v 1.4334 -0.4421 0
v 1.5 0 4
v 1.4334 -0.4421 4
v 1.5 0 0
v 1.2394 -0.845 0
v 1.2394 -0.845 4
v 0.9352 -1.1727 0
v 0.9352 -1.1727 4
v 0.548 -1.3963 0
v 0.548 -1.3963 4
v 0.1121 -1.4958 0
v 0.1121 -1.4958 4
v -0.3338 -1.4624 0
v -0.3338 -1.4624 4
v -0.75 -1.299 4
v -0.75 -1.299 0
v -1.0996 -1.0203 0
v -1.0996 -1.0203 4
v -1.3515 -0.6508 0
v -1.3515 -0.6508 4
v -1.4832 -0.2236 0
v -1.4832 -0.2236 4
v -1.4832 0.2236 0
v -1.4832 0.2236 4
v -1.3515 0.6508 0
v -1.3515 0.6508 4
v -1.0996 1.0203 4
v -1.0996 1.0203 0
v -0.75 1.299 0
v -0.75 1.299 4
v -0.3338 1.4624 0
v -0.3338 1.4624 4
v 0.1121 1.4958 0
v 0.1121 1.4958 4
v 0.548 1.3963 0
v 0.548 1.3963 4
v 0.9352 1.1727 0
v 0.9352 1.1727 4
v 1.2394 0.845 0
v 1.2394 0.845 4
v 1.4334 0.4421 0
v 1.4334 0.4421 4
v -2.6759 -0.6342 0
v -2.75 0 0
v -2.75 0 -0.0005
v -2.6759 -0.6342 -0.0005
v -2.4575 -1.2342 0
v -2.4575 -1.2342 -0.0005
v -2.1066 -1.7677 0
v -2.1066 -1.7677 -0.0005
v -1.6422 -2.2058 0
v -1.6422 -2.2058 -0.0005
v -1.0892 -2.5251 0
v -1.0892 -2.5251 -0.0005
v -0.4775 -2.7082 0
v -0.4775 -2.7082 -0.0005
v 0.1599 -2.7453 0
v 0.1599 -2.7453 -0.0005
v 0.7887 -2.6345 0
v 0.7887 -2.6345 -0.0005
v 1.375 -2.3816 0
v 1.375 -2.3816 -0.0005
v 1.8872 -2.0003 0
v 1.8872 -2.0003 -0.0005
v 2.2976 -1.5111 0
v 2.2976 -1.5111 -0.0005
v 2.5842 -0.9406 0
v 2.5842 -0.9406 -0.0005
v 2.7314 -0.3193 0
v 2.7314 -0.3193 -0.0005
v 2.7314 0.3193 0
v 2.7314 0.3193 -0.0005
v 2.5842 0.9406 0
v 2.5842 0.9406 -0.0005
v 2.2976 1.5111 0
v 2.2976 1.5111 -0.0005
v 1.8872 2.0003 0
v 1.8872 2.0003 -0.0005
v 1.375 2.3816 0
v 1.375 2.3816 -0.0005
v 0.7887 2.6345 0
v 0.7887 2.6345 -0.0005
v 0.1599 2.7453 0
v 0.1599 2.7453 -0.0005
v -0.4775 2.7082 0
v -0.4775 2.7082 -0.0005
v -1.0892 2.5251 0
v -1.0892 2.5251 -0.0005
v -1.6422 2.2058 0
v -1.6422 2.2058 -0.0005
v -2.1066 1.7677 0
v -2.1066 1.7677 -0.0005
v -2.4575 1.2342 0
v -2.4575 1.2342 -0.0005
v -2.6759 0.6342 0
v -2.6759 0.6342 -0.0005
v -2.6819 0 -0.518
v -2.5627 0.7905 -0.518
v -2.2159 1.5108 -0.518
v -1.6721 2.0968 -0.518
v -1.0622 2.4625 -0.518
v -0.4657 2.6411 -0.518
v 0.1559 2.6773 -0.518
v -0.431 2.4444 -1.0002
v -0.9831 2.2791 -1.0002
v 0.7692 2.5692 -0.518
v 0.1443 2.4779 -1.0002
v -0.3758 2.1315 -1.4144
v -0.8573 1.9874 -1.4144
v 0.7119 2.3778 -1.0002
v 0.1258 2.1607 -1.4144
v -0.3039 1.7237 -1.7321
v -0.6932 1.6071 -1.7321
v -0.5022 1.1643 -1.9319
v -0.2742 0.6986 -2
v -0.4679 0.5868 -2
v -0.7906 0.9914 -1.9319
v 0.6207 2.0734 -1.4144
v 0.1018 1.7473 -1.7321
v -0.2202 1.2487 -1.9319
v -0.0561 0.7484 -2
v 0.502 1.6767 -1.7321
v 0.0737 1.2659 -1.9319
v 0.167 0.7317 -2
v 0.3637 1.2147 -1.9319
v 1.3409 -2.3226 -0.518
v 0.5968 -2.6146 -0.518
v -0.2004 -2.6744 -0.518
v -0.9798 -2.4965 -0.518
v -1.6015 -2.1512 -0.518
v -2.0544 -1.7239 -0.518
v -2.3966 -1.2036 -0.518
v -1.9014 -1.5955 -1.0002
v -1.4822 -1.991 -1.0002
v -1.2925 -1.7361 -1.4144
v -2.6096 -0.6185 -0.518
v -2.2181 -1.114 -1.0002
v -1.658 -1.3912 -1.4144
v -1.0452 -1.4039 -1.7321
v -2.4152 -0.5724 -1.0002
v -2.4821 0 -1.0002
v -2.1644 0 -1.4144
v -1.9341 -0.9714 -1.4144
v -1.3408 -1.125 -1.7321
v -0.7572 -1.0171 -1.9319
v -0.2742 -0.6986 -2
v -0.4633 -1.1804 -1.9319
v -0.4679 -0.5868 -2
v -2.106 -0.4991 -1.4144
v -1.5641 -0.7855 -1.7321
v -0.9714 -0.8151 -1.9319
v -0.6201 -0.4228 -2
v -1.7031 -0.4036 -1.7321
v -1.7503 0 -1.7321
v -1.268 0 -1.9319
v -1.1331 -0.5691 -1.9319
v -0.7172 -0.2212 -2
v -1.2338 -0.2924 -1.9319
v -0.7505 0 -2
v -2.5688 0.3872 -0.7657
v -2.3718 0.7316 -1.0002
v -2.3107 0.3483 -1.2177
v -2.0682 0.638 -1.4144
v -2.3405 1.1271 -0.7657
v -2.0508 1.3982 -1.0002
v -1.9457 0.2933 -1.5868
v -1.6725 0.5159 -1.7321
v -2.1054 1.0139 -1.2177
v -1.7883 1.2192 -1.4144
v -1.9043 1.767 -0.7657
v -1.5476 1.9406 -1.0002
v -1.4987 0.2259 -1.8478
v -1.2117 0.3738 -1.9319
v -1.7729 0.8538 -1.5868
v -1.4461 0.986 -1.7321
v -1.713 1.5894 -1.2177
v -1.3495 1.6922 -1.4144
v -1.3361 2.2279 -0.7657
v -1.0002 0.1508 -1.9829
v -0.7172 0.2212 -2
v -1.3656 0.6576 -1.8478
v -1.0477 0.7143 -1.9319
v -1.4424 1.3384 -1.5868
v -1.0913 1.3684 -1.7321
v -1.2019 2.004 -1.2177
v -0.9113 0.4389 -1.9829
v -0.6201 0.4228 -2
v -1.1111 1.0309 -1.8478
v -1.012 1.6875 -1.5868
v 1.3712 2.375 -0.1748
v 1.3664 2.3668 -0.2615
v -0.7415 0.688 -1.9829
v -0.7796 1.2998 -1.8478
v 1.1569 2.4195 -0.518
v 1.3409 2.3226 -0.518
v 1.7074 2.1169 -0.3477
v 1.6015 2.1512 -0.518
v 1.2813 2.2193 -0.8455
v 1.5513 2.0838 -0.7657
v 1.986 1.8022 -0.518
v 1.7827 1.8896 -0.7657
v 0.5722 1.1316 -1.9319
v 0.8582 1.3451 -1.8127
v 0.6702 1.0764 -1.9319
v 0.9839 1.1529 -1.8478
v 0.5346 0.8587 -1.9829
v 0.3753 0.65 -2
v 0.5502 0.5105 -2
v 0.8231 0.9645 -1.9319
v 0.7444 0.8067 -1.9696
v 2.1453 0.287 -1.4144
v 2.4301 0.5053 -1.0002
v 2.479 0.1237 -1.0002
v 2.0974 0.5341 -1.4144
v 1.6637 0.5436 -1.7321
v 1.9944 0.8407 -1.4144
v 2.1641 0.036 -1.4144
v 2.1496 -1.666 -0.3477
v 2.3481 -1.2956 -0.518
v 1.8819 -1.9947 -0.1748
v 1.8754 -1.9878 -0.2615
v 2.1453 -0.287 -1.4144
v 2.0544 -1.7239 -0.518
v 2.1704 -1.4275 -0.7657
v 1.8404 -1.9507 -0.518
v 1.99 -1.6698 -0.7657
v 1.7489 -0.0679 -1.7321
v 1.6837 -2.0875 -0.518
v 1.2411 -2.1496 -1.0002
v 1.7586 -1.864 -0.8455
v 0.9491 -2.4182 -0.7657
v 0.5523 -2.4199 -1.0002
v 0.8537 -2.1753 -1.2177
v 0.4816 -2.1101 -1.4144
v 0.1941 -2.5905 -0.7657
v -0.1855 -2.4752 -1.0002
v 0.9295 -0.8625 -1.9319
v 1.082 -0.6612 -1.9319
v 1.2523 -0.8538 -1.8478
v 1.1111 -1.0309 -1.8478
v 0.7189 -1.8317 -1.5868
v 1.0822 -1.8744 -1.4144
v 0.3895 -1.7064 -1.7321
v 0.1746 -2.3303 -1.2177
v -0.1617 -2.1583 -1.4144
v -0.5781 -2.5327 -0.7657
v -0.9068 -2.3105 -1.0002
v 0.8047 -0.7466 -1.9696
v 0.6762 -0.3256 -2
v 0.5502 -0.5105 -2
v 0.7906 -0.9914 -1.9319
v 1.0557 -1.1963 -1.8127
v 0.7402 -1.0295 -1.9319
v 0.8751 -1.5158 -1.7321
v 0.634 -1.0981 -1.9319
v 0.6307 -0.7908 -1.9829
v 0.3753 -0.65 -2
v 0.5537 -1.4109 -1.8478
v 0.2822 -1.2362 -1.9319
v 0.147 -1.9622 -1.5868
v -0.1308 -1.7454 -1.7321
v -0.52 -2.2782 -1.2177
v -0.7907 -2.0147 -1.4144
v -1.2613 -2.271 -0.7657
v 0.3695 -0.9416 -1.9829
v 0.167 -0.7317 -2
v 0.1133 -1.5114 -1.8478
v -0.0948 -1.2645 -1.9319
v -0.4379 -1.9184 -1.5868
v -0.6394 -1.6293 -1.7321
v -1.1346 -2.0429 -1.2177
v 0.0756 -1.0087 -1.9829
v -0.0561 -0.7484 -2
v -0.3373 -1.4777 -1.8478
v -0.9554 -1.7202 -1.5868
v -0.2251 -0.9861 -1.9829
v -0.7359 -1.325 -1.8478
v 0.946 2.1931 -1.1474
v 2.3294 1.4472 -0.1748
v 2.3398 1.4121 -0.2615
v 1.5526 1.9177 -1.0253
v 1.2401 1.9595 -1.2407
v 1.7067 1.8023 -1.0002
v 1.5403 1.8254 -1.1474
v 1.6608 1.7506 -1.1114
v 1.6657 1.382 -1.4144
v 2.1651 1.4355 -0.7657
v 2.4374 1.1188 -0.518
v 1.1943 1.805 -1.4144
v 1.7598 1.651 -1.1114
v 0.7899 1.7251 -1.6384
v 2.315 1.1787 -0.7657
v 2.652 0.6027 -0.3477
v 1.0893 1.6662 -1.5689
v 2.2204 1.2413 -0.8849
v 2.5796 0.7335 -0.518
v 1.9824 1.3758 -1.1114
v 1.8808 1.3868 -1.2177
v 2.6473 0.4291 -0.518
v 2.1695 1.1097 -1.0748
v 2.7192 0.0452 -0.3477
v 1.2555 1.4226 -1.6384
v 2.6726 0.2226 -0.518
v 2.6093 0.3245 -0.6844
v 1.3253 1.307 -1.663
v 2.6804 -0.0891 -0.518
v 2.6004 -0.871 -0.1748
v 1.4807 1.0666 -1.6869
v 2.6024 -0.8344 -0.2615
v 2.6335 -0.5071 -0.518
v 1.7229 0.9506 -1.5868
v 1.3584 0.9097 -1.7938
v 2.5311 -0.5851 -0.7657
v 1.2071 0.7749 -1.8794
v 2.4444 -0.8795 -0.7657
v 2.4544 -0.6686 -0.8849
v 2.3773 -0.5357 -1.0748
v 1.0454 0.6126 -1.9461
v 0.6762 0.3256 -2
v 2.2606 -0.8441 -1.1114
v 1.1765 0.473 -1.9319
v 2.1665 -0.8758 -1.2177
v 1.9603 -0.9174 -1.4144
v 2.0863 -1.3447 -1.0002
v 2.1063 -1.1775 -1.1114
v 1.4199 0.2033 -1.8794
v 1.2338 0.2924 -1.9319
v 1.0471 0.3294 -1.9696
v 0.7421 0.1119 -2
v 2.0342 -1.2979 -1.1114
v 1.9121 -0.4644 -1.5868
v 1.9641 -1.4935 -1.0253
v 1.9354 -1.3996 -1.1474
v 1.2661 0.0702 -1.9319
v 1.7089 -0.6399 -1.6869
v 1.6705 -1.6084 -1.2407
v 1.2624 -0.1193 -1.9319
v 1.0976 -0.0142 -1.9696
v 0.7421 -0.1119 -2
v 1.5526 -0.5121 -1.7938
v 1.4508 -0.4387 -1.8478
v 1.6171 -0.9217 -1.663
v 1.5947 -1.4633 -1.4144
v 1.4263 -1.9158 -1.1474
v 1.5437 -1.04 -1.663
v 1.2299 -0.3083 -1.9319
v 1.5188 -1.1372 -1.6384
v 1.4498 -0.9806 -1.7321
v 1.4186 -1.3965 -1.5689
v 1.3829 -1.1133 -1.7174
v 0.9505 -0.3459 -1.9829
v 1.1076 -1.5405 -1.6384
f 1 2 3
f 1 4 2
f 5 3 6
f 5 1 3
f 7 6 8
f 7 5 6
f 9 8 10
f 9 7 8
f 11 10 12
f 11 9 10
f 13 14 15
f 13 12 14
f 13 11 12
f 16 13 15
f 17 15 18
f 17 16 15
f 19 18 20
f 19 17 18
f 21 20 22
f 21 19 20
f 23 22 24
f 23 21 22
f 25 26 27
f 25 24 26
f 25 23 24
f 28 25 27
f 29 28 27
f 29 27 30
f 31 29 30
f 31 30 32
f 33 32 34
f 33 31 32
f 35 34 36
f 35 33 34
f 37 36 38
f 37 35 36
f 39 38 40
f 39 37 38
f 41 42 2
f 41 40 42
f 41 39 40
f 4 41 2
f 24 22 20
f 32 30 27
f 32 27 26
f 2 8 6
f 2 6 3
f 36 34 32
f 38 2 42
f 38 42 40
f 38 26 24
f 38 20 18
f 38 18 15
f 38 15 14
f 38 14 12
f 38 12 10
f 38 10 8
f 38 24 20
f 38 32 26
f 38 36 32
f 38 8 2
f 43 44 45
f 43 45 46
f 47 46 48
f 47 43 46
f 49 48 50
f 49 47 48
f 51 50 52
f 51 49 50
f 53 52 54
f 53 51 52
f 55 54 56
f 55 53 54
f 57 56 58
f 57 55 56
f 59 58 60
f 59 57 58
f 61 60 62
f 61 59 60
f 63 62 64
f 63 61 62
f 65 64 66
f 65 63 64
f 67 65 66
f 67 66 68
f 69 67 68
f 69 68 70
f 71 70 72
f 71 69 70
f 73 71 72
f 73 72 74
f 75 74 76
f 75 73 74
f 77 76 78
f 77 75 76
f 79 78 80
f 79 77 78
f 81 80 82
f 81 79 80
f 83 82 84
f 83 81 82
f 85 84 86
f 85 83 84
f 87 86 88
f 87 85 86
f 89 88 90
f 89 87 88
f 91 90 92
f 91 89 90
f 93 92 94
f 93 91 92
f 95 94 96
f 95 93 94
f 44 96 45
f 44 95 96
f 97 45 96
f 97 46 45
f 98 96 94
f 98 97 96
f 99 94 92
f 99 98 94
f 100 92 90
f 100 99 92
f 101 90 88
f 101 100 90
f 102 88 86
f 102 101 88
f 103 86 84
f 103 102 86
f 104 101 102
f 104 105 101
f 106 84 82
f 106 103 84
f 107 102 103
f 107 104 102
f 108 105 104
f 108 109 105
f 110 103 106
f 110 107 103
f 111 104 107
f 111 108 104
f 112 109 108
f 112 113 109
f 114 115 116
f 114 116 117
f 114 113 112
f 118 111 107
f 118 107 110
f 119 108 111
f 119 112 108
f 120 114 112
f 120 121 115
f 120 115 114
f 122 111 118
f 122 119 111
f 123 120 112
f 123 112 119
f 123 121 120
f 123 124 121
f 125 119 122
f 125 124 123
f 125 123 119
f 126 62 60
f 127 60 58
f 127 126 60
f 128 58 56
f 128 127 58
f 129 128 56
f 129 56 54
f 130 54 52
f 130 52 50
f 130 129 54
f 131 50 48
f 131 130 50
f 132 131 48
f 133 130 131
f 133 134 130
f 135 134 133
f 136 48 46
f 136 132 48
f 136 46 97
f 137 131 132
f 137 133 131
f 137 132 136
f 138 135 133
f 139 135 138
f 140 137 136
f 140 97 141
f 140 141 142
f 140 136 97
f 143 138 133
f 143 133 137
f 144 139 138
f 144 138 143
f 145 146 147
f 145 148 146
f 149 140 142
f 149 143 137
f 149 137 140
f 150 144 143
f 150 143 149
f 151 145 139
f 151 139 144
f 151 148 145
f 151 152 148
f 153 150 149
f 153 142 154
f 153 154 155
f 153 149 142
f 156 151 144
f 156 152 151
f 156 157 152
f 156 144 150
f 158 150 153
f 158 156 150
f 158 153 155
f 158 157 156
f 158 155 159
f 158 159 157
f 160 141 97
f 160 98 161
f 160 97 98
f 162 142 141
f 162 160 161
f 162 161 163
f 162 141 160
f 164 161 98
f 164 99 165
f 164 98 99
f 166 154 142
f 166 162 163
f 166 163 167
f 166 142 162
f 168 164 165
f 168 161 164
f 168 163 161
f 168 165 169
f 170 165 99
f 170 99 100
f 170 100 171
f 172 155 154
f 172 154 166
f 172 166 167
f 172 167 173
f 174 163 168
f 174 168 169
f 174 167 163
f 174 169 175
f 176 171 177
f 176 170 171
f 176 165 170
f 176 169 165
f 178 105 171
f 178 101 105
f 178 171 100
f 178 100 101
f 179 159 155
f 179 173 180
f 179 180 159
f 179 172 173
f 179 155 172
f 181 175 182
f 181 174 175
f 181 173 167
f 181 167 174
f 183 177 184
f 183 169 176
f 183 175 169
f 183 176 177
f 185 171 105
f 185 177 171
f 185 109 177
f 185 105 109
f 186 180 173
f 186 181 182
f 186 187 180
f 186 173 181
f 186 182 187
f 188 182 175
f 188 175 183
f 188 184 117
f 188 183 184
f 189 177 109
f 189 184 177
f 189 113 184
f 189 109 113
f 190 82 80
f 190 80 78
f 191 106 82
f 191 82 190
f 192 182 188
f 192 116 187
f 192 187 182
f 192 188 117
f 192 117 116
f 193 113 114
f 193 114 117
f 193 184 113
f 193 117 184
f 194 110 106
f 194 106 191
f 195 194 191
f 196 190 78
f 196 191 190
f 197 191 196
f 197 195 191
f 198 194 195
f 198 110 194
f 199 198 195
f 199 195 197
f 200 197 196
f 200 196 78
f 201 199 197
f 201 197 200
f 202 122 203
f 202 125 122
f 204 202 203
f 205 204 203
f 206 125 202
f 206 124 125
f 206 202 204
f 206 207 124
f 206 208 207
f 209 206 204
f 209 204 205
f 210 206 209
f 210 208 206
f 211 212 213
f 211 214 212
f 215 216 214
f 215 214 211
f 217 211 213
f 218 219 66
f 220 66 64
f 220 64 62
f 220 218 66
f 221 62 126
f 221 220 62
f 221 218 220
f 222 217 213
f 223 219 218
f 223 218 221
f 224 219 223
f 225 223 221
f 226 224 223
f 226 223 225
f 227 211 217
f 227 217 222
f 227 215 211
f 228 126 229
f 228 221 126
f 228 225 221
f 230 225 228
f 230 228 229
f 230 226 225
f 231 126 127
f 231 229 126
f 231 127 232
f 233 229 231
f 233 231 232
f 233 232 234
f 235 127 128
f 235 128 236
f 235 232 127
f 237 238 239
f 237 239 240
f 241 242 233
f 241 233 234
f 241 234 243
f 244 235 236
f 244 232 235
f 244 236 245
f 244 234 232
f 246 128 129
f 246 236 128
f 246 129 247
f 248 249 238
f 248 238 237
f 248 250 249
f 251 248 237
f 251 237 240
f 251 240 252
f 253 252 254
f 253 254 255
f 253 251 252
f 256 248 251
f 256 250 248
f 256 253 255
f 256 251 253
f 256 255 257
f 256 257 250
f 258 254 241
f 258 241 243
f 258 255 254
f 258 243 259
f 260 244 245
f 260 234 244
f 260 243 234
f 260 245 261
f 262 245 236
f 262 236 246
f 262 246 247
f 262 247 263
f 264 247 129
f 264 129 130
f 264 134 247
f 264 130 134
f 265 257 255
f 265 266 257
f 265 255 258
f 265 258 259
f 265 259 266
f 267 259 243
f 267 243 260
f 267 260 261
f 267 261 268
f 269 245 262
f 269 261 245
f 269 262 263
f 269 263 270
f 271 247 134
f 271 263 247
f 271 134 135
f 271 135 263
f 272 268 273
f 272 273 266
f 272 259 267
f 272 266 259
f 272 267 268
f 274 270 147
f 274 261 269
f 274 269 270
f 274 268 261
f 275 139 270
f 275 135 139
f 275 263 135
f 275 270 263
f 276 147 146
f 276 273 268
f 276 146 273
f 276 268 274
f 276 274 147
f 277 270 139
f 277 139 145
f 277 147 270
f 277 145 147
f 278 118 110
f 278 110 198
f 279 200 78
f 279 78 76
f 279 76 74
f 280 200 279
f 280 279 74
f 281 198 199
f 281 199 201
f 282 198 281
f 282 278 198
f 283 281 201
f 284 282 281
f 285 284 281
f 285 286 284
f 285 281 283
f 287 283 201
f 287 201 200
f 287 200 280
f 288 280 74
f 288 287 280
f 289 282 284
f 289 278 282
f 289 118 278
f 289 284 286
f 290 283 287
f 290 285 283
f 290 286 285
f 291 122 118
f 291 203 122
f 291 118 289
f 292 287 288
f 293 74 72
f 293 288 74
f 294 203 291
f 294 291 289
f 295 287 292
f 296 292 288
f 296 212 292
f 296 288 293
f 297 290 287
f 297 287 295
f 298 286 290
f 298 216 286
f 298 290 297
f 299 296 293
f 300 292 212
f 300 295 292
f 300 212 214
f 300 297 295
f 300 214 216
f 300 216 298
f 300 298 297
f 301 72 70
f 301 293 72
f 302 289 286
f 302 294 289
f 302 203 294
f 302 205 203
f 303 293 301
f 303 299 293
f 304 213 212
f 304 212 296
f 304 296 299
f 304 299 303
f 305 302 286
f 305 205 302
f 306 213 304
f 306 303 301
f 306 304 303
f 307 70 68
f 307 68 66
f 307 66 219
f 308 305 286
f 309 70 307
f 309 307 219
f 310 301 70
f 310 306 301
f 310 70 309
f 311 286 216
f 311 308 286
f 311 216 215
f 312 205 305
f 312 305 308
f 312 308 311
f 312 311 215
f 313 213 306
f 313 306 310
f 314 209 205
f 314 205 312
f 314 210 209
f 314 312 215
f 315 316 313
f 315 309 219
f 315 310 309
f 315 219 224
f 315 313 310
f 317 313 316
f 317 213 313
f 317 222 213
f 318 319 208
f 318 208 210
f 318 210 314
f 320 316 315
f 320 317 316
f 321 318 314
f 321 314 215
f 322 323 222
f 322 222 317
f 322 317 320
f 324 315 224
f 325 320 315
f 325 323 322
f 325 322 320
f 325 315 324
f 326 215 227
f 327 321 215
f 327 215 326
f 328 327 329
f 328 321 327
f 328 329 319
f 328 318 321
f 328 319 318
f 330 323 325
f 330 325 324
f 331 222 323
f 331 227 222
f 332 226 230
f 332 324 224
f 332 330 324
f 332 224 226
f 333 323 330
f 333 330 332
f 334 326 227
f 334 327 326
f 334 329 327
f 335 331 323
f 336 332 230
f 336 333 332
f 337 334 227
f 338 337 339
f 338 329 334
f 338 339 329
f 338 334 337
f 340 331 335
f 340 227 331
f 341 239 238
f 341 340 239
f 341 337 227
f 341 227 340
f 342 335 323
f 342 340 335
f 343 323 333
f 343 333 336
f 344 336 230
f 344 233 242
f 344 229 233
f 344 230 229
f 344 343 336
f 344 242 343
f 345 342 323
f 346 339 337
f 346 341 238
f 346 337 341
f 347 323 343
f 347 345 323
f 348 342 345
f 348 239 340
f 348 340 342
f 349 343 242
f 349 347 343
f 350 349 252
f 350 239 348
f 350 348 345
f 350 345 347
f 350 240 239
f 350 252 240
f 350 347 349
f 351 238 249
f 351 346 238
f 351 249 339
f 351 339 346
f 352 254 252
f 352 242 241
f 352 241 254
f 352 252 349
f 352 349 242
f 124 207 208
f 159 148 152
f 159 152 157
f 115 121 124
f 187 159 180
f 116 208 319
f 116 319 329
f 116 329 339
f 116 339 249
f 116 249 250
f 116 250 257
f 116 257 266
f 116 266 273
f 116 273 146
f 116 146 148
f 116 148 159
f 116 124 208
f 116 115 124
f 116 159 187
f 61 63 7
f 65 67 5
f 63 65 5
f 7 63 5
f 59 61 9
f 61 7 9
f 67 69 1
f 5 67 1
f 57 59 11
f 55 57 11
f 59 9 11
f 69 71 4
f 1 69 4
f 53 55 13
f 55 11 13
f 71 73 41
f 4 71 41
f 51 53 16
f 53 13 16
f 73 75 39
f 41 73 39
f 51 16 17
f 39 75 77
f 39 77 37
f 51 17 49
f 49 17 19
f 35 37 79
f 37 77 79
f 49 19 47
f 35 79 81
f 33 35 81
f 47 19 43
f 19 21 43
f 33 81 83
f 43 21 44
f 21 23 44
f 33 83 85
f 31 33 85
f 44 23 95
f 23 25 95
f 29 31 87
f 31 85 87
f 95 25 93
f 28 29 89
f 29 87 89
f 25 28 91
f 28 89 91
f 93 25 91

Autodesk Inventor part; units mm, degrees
ref_plane "YZ Plane" through (0, 0, 0) normal (1, 0, 0) x (0, 1, 0)
ref_plane "XZ Plane" through (0, 0, 0) normal (0, 1, 0) x (-1, 0, 0)
ref_plane "XY Plane" through (0, 0, 0) normal (0, 0, 1) x (1, 0, 0)
sketch "スケッチ1" plane through (0, 0, 0) normal (0, 0, 1) x (1, 0, 0)
  circle A0 centre (0, 0) radius 1.5
  dimension "d0" = 3
extrude "押し出し1" add sketch "スケッチ1" along normal blind 4
sketch "スケッチ2" plane through (0, 0, 0) normal (0, 0, -1) x (-1, 0, 0)
  circle A0 centre (0, 0) radius 2.75
  dimension "d3" = 5.5
extrude "押し出し2" add sketch "スケッチ2" along normal blind 2
fillet "フィレット1" radius 2 1 edges at (2.75, 0, -2)
thread "ねじ1" size "M3x0.5" class "6g" standard "ANSI Metric M Profile" full length
properties part number "ネジ鍋m3,04" material "鋼、高強度、低合金"
